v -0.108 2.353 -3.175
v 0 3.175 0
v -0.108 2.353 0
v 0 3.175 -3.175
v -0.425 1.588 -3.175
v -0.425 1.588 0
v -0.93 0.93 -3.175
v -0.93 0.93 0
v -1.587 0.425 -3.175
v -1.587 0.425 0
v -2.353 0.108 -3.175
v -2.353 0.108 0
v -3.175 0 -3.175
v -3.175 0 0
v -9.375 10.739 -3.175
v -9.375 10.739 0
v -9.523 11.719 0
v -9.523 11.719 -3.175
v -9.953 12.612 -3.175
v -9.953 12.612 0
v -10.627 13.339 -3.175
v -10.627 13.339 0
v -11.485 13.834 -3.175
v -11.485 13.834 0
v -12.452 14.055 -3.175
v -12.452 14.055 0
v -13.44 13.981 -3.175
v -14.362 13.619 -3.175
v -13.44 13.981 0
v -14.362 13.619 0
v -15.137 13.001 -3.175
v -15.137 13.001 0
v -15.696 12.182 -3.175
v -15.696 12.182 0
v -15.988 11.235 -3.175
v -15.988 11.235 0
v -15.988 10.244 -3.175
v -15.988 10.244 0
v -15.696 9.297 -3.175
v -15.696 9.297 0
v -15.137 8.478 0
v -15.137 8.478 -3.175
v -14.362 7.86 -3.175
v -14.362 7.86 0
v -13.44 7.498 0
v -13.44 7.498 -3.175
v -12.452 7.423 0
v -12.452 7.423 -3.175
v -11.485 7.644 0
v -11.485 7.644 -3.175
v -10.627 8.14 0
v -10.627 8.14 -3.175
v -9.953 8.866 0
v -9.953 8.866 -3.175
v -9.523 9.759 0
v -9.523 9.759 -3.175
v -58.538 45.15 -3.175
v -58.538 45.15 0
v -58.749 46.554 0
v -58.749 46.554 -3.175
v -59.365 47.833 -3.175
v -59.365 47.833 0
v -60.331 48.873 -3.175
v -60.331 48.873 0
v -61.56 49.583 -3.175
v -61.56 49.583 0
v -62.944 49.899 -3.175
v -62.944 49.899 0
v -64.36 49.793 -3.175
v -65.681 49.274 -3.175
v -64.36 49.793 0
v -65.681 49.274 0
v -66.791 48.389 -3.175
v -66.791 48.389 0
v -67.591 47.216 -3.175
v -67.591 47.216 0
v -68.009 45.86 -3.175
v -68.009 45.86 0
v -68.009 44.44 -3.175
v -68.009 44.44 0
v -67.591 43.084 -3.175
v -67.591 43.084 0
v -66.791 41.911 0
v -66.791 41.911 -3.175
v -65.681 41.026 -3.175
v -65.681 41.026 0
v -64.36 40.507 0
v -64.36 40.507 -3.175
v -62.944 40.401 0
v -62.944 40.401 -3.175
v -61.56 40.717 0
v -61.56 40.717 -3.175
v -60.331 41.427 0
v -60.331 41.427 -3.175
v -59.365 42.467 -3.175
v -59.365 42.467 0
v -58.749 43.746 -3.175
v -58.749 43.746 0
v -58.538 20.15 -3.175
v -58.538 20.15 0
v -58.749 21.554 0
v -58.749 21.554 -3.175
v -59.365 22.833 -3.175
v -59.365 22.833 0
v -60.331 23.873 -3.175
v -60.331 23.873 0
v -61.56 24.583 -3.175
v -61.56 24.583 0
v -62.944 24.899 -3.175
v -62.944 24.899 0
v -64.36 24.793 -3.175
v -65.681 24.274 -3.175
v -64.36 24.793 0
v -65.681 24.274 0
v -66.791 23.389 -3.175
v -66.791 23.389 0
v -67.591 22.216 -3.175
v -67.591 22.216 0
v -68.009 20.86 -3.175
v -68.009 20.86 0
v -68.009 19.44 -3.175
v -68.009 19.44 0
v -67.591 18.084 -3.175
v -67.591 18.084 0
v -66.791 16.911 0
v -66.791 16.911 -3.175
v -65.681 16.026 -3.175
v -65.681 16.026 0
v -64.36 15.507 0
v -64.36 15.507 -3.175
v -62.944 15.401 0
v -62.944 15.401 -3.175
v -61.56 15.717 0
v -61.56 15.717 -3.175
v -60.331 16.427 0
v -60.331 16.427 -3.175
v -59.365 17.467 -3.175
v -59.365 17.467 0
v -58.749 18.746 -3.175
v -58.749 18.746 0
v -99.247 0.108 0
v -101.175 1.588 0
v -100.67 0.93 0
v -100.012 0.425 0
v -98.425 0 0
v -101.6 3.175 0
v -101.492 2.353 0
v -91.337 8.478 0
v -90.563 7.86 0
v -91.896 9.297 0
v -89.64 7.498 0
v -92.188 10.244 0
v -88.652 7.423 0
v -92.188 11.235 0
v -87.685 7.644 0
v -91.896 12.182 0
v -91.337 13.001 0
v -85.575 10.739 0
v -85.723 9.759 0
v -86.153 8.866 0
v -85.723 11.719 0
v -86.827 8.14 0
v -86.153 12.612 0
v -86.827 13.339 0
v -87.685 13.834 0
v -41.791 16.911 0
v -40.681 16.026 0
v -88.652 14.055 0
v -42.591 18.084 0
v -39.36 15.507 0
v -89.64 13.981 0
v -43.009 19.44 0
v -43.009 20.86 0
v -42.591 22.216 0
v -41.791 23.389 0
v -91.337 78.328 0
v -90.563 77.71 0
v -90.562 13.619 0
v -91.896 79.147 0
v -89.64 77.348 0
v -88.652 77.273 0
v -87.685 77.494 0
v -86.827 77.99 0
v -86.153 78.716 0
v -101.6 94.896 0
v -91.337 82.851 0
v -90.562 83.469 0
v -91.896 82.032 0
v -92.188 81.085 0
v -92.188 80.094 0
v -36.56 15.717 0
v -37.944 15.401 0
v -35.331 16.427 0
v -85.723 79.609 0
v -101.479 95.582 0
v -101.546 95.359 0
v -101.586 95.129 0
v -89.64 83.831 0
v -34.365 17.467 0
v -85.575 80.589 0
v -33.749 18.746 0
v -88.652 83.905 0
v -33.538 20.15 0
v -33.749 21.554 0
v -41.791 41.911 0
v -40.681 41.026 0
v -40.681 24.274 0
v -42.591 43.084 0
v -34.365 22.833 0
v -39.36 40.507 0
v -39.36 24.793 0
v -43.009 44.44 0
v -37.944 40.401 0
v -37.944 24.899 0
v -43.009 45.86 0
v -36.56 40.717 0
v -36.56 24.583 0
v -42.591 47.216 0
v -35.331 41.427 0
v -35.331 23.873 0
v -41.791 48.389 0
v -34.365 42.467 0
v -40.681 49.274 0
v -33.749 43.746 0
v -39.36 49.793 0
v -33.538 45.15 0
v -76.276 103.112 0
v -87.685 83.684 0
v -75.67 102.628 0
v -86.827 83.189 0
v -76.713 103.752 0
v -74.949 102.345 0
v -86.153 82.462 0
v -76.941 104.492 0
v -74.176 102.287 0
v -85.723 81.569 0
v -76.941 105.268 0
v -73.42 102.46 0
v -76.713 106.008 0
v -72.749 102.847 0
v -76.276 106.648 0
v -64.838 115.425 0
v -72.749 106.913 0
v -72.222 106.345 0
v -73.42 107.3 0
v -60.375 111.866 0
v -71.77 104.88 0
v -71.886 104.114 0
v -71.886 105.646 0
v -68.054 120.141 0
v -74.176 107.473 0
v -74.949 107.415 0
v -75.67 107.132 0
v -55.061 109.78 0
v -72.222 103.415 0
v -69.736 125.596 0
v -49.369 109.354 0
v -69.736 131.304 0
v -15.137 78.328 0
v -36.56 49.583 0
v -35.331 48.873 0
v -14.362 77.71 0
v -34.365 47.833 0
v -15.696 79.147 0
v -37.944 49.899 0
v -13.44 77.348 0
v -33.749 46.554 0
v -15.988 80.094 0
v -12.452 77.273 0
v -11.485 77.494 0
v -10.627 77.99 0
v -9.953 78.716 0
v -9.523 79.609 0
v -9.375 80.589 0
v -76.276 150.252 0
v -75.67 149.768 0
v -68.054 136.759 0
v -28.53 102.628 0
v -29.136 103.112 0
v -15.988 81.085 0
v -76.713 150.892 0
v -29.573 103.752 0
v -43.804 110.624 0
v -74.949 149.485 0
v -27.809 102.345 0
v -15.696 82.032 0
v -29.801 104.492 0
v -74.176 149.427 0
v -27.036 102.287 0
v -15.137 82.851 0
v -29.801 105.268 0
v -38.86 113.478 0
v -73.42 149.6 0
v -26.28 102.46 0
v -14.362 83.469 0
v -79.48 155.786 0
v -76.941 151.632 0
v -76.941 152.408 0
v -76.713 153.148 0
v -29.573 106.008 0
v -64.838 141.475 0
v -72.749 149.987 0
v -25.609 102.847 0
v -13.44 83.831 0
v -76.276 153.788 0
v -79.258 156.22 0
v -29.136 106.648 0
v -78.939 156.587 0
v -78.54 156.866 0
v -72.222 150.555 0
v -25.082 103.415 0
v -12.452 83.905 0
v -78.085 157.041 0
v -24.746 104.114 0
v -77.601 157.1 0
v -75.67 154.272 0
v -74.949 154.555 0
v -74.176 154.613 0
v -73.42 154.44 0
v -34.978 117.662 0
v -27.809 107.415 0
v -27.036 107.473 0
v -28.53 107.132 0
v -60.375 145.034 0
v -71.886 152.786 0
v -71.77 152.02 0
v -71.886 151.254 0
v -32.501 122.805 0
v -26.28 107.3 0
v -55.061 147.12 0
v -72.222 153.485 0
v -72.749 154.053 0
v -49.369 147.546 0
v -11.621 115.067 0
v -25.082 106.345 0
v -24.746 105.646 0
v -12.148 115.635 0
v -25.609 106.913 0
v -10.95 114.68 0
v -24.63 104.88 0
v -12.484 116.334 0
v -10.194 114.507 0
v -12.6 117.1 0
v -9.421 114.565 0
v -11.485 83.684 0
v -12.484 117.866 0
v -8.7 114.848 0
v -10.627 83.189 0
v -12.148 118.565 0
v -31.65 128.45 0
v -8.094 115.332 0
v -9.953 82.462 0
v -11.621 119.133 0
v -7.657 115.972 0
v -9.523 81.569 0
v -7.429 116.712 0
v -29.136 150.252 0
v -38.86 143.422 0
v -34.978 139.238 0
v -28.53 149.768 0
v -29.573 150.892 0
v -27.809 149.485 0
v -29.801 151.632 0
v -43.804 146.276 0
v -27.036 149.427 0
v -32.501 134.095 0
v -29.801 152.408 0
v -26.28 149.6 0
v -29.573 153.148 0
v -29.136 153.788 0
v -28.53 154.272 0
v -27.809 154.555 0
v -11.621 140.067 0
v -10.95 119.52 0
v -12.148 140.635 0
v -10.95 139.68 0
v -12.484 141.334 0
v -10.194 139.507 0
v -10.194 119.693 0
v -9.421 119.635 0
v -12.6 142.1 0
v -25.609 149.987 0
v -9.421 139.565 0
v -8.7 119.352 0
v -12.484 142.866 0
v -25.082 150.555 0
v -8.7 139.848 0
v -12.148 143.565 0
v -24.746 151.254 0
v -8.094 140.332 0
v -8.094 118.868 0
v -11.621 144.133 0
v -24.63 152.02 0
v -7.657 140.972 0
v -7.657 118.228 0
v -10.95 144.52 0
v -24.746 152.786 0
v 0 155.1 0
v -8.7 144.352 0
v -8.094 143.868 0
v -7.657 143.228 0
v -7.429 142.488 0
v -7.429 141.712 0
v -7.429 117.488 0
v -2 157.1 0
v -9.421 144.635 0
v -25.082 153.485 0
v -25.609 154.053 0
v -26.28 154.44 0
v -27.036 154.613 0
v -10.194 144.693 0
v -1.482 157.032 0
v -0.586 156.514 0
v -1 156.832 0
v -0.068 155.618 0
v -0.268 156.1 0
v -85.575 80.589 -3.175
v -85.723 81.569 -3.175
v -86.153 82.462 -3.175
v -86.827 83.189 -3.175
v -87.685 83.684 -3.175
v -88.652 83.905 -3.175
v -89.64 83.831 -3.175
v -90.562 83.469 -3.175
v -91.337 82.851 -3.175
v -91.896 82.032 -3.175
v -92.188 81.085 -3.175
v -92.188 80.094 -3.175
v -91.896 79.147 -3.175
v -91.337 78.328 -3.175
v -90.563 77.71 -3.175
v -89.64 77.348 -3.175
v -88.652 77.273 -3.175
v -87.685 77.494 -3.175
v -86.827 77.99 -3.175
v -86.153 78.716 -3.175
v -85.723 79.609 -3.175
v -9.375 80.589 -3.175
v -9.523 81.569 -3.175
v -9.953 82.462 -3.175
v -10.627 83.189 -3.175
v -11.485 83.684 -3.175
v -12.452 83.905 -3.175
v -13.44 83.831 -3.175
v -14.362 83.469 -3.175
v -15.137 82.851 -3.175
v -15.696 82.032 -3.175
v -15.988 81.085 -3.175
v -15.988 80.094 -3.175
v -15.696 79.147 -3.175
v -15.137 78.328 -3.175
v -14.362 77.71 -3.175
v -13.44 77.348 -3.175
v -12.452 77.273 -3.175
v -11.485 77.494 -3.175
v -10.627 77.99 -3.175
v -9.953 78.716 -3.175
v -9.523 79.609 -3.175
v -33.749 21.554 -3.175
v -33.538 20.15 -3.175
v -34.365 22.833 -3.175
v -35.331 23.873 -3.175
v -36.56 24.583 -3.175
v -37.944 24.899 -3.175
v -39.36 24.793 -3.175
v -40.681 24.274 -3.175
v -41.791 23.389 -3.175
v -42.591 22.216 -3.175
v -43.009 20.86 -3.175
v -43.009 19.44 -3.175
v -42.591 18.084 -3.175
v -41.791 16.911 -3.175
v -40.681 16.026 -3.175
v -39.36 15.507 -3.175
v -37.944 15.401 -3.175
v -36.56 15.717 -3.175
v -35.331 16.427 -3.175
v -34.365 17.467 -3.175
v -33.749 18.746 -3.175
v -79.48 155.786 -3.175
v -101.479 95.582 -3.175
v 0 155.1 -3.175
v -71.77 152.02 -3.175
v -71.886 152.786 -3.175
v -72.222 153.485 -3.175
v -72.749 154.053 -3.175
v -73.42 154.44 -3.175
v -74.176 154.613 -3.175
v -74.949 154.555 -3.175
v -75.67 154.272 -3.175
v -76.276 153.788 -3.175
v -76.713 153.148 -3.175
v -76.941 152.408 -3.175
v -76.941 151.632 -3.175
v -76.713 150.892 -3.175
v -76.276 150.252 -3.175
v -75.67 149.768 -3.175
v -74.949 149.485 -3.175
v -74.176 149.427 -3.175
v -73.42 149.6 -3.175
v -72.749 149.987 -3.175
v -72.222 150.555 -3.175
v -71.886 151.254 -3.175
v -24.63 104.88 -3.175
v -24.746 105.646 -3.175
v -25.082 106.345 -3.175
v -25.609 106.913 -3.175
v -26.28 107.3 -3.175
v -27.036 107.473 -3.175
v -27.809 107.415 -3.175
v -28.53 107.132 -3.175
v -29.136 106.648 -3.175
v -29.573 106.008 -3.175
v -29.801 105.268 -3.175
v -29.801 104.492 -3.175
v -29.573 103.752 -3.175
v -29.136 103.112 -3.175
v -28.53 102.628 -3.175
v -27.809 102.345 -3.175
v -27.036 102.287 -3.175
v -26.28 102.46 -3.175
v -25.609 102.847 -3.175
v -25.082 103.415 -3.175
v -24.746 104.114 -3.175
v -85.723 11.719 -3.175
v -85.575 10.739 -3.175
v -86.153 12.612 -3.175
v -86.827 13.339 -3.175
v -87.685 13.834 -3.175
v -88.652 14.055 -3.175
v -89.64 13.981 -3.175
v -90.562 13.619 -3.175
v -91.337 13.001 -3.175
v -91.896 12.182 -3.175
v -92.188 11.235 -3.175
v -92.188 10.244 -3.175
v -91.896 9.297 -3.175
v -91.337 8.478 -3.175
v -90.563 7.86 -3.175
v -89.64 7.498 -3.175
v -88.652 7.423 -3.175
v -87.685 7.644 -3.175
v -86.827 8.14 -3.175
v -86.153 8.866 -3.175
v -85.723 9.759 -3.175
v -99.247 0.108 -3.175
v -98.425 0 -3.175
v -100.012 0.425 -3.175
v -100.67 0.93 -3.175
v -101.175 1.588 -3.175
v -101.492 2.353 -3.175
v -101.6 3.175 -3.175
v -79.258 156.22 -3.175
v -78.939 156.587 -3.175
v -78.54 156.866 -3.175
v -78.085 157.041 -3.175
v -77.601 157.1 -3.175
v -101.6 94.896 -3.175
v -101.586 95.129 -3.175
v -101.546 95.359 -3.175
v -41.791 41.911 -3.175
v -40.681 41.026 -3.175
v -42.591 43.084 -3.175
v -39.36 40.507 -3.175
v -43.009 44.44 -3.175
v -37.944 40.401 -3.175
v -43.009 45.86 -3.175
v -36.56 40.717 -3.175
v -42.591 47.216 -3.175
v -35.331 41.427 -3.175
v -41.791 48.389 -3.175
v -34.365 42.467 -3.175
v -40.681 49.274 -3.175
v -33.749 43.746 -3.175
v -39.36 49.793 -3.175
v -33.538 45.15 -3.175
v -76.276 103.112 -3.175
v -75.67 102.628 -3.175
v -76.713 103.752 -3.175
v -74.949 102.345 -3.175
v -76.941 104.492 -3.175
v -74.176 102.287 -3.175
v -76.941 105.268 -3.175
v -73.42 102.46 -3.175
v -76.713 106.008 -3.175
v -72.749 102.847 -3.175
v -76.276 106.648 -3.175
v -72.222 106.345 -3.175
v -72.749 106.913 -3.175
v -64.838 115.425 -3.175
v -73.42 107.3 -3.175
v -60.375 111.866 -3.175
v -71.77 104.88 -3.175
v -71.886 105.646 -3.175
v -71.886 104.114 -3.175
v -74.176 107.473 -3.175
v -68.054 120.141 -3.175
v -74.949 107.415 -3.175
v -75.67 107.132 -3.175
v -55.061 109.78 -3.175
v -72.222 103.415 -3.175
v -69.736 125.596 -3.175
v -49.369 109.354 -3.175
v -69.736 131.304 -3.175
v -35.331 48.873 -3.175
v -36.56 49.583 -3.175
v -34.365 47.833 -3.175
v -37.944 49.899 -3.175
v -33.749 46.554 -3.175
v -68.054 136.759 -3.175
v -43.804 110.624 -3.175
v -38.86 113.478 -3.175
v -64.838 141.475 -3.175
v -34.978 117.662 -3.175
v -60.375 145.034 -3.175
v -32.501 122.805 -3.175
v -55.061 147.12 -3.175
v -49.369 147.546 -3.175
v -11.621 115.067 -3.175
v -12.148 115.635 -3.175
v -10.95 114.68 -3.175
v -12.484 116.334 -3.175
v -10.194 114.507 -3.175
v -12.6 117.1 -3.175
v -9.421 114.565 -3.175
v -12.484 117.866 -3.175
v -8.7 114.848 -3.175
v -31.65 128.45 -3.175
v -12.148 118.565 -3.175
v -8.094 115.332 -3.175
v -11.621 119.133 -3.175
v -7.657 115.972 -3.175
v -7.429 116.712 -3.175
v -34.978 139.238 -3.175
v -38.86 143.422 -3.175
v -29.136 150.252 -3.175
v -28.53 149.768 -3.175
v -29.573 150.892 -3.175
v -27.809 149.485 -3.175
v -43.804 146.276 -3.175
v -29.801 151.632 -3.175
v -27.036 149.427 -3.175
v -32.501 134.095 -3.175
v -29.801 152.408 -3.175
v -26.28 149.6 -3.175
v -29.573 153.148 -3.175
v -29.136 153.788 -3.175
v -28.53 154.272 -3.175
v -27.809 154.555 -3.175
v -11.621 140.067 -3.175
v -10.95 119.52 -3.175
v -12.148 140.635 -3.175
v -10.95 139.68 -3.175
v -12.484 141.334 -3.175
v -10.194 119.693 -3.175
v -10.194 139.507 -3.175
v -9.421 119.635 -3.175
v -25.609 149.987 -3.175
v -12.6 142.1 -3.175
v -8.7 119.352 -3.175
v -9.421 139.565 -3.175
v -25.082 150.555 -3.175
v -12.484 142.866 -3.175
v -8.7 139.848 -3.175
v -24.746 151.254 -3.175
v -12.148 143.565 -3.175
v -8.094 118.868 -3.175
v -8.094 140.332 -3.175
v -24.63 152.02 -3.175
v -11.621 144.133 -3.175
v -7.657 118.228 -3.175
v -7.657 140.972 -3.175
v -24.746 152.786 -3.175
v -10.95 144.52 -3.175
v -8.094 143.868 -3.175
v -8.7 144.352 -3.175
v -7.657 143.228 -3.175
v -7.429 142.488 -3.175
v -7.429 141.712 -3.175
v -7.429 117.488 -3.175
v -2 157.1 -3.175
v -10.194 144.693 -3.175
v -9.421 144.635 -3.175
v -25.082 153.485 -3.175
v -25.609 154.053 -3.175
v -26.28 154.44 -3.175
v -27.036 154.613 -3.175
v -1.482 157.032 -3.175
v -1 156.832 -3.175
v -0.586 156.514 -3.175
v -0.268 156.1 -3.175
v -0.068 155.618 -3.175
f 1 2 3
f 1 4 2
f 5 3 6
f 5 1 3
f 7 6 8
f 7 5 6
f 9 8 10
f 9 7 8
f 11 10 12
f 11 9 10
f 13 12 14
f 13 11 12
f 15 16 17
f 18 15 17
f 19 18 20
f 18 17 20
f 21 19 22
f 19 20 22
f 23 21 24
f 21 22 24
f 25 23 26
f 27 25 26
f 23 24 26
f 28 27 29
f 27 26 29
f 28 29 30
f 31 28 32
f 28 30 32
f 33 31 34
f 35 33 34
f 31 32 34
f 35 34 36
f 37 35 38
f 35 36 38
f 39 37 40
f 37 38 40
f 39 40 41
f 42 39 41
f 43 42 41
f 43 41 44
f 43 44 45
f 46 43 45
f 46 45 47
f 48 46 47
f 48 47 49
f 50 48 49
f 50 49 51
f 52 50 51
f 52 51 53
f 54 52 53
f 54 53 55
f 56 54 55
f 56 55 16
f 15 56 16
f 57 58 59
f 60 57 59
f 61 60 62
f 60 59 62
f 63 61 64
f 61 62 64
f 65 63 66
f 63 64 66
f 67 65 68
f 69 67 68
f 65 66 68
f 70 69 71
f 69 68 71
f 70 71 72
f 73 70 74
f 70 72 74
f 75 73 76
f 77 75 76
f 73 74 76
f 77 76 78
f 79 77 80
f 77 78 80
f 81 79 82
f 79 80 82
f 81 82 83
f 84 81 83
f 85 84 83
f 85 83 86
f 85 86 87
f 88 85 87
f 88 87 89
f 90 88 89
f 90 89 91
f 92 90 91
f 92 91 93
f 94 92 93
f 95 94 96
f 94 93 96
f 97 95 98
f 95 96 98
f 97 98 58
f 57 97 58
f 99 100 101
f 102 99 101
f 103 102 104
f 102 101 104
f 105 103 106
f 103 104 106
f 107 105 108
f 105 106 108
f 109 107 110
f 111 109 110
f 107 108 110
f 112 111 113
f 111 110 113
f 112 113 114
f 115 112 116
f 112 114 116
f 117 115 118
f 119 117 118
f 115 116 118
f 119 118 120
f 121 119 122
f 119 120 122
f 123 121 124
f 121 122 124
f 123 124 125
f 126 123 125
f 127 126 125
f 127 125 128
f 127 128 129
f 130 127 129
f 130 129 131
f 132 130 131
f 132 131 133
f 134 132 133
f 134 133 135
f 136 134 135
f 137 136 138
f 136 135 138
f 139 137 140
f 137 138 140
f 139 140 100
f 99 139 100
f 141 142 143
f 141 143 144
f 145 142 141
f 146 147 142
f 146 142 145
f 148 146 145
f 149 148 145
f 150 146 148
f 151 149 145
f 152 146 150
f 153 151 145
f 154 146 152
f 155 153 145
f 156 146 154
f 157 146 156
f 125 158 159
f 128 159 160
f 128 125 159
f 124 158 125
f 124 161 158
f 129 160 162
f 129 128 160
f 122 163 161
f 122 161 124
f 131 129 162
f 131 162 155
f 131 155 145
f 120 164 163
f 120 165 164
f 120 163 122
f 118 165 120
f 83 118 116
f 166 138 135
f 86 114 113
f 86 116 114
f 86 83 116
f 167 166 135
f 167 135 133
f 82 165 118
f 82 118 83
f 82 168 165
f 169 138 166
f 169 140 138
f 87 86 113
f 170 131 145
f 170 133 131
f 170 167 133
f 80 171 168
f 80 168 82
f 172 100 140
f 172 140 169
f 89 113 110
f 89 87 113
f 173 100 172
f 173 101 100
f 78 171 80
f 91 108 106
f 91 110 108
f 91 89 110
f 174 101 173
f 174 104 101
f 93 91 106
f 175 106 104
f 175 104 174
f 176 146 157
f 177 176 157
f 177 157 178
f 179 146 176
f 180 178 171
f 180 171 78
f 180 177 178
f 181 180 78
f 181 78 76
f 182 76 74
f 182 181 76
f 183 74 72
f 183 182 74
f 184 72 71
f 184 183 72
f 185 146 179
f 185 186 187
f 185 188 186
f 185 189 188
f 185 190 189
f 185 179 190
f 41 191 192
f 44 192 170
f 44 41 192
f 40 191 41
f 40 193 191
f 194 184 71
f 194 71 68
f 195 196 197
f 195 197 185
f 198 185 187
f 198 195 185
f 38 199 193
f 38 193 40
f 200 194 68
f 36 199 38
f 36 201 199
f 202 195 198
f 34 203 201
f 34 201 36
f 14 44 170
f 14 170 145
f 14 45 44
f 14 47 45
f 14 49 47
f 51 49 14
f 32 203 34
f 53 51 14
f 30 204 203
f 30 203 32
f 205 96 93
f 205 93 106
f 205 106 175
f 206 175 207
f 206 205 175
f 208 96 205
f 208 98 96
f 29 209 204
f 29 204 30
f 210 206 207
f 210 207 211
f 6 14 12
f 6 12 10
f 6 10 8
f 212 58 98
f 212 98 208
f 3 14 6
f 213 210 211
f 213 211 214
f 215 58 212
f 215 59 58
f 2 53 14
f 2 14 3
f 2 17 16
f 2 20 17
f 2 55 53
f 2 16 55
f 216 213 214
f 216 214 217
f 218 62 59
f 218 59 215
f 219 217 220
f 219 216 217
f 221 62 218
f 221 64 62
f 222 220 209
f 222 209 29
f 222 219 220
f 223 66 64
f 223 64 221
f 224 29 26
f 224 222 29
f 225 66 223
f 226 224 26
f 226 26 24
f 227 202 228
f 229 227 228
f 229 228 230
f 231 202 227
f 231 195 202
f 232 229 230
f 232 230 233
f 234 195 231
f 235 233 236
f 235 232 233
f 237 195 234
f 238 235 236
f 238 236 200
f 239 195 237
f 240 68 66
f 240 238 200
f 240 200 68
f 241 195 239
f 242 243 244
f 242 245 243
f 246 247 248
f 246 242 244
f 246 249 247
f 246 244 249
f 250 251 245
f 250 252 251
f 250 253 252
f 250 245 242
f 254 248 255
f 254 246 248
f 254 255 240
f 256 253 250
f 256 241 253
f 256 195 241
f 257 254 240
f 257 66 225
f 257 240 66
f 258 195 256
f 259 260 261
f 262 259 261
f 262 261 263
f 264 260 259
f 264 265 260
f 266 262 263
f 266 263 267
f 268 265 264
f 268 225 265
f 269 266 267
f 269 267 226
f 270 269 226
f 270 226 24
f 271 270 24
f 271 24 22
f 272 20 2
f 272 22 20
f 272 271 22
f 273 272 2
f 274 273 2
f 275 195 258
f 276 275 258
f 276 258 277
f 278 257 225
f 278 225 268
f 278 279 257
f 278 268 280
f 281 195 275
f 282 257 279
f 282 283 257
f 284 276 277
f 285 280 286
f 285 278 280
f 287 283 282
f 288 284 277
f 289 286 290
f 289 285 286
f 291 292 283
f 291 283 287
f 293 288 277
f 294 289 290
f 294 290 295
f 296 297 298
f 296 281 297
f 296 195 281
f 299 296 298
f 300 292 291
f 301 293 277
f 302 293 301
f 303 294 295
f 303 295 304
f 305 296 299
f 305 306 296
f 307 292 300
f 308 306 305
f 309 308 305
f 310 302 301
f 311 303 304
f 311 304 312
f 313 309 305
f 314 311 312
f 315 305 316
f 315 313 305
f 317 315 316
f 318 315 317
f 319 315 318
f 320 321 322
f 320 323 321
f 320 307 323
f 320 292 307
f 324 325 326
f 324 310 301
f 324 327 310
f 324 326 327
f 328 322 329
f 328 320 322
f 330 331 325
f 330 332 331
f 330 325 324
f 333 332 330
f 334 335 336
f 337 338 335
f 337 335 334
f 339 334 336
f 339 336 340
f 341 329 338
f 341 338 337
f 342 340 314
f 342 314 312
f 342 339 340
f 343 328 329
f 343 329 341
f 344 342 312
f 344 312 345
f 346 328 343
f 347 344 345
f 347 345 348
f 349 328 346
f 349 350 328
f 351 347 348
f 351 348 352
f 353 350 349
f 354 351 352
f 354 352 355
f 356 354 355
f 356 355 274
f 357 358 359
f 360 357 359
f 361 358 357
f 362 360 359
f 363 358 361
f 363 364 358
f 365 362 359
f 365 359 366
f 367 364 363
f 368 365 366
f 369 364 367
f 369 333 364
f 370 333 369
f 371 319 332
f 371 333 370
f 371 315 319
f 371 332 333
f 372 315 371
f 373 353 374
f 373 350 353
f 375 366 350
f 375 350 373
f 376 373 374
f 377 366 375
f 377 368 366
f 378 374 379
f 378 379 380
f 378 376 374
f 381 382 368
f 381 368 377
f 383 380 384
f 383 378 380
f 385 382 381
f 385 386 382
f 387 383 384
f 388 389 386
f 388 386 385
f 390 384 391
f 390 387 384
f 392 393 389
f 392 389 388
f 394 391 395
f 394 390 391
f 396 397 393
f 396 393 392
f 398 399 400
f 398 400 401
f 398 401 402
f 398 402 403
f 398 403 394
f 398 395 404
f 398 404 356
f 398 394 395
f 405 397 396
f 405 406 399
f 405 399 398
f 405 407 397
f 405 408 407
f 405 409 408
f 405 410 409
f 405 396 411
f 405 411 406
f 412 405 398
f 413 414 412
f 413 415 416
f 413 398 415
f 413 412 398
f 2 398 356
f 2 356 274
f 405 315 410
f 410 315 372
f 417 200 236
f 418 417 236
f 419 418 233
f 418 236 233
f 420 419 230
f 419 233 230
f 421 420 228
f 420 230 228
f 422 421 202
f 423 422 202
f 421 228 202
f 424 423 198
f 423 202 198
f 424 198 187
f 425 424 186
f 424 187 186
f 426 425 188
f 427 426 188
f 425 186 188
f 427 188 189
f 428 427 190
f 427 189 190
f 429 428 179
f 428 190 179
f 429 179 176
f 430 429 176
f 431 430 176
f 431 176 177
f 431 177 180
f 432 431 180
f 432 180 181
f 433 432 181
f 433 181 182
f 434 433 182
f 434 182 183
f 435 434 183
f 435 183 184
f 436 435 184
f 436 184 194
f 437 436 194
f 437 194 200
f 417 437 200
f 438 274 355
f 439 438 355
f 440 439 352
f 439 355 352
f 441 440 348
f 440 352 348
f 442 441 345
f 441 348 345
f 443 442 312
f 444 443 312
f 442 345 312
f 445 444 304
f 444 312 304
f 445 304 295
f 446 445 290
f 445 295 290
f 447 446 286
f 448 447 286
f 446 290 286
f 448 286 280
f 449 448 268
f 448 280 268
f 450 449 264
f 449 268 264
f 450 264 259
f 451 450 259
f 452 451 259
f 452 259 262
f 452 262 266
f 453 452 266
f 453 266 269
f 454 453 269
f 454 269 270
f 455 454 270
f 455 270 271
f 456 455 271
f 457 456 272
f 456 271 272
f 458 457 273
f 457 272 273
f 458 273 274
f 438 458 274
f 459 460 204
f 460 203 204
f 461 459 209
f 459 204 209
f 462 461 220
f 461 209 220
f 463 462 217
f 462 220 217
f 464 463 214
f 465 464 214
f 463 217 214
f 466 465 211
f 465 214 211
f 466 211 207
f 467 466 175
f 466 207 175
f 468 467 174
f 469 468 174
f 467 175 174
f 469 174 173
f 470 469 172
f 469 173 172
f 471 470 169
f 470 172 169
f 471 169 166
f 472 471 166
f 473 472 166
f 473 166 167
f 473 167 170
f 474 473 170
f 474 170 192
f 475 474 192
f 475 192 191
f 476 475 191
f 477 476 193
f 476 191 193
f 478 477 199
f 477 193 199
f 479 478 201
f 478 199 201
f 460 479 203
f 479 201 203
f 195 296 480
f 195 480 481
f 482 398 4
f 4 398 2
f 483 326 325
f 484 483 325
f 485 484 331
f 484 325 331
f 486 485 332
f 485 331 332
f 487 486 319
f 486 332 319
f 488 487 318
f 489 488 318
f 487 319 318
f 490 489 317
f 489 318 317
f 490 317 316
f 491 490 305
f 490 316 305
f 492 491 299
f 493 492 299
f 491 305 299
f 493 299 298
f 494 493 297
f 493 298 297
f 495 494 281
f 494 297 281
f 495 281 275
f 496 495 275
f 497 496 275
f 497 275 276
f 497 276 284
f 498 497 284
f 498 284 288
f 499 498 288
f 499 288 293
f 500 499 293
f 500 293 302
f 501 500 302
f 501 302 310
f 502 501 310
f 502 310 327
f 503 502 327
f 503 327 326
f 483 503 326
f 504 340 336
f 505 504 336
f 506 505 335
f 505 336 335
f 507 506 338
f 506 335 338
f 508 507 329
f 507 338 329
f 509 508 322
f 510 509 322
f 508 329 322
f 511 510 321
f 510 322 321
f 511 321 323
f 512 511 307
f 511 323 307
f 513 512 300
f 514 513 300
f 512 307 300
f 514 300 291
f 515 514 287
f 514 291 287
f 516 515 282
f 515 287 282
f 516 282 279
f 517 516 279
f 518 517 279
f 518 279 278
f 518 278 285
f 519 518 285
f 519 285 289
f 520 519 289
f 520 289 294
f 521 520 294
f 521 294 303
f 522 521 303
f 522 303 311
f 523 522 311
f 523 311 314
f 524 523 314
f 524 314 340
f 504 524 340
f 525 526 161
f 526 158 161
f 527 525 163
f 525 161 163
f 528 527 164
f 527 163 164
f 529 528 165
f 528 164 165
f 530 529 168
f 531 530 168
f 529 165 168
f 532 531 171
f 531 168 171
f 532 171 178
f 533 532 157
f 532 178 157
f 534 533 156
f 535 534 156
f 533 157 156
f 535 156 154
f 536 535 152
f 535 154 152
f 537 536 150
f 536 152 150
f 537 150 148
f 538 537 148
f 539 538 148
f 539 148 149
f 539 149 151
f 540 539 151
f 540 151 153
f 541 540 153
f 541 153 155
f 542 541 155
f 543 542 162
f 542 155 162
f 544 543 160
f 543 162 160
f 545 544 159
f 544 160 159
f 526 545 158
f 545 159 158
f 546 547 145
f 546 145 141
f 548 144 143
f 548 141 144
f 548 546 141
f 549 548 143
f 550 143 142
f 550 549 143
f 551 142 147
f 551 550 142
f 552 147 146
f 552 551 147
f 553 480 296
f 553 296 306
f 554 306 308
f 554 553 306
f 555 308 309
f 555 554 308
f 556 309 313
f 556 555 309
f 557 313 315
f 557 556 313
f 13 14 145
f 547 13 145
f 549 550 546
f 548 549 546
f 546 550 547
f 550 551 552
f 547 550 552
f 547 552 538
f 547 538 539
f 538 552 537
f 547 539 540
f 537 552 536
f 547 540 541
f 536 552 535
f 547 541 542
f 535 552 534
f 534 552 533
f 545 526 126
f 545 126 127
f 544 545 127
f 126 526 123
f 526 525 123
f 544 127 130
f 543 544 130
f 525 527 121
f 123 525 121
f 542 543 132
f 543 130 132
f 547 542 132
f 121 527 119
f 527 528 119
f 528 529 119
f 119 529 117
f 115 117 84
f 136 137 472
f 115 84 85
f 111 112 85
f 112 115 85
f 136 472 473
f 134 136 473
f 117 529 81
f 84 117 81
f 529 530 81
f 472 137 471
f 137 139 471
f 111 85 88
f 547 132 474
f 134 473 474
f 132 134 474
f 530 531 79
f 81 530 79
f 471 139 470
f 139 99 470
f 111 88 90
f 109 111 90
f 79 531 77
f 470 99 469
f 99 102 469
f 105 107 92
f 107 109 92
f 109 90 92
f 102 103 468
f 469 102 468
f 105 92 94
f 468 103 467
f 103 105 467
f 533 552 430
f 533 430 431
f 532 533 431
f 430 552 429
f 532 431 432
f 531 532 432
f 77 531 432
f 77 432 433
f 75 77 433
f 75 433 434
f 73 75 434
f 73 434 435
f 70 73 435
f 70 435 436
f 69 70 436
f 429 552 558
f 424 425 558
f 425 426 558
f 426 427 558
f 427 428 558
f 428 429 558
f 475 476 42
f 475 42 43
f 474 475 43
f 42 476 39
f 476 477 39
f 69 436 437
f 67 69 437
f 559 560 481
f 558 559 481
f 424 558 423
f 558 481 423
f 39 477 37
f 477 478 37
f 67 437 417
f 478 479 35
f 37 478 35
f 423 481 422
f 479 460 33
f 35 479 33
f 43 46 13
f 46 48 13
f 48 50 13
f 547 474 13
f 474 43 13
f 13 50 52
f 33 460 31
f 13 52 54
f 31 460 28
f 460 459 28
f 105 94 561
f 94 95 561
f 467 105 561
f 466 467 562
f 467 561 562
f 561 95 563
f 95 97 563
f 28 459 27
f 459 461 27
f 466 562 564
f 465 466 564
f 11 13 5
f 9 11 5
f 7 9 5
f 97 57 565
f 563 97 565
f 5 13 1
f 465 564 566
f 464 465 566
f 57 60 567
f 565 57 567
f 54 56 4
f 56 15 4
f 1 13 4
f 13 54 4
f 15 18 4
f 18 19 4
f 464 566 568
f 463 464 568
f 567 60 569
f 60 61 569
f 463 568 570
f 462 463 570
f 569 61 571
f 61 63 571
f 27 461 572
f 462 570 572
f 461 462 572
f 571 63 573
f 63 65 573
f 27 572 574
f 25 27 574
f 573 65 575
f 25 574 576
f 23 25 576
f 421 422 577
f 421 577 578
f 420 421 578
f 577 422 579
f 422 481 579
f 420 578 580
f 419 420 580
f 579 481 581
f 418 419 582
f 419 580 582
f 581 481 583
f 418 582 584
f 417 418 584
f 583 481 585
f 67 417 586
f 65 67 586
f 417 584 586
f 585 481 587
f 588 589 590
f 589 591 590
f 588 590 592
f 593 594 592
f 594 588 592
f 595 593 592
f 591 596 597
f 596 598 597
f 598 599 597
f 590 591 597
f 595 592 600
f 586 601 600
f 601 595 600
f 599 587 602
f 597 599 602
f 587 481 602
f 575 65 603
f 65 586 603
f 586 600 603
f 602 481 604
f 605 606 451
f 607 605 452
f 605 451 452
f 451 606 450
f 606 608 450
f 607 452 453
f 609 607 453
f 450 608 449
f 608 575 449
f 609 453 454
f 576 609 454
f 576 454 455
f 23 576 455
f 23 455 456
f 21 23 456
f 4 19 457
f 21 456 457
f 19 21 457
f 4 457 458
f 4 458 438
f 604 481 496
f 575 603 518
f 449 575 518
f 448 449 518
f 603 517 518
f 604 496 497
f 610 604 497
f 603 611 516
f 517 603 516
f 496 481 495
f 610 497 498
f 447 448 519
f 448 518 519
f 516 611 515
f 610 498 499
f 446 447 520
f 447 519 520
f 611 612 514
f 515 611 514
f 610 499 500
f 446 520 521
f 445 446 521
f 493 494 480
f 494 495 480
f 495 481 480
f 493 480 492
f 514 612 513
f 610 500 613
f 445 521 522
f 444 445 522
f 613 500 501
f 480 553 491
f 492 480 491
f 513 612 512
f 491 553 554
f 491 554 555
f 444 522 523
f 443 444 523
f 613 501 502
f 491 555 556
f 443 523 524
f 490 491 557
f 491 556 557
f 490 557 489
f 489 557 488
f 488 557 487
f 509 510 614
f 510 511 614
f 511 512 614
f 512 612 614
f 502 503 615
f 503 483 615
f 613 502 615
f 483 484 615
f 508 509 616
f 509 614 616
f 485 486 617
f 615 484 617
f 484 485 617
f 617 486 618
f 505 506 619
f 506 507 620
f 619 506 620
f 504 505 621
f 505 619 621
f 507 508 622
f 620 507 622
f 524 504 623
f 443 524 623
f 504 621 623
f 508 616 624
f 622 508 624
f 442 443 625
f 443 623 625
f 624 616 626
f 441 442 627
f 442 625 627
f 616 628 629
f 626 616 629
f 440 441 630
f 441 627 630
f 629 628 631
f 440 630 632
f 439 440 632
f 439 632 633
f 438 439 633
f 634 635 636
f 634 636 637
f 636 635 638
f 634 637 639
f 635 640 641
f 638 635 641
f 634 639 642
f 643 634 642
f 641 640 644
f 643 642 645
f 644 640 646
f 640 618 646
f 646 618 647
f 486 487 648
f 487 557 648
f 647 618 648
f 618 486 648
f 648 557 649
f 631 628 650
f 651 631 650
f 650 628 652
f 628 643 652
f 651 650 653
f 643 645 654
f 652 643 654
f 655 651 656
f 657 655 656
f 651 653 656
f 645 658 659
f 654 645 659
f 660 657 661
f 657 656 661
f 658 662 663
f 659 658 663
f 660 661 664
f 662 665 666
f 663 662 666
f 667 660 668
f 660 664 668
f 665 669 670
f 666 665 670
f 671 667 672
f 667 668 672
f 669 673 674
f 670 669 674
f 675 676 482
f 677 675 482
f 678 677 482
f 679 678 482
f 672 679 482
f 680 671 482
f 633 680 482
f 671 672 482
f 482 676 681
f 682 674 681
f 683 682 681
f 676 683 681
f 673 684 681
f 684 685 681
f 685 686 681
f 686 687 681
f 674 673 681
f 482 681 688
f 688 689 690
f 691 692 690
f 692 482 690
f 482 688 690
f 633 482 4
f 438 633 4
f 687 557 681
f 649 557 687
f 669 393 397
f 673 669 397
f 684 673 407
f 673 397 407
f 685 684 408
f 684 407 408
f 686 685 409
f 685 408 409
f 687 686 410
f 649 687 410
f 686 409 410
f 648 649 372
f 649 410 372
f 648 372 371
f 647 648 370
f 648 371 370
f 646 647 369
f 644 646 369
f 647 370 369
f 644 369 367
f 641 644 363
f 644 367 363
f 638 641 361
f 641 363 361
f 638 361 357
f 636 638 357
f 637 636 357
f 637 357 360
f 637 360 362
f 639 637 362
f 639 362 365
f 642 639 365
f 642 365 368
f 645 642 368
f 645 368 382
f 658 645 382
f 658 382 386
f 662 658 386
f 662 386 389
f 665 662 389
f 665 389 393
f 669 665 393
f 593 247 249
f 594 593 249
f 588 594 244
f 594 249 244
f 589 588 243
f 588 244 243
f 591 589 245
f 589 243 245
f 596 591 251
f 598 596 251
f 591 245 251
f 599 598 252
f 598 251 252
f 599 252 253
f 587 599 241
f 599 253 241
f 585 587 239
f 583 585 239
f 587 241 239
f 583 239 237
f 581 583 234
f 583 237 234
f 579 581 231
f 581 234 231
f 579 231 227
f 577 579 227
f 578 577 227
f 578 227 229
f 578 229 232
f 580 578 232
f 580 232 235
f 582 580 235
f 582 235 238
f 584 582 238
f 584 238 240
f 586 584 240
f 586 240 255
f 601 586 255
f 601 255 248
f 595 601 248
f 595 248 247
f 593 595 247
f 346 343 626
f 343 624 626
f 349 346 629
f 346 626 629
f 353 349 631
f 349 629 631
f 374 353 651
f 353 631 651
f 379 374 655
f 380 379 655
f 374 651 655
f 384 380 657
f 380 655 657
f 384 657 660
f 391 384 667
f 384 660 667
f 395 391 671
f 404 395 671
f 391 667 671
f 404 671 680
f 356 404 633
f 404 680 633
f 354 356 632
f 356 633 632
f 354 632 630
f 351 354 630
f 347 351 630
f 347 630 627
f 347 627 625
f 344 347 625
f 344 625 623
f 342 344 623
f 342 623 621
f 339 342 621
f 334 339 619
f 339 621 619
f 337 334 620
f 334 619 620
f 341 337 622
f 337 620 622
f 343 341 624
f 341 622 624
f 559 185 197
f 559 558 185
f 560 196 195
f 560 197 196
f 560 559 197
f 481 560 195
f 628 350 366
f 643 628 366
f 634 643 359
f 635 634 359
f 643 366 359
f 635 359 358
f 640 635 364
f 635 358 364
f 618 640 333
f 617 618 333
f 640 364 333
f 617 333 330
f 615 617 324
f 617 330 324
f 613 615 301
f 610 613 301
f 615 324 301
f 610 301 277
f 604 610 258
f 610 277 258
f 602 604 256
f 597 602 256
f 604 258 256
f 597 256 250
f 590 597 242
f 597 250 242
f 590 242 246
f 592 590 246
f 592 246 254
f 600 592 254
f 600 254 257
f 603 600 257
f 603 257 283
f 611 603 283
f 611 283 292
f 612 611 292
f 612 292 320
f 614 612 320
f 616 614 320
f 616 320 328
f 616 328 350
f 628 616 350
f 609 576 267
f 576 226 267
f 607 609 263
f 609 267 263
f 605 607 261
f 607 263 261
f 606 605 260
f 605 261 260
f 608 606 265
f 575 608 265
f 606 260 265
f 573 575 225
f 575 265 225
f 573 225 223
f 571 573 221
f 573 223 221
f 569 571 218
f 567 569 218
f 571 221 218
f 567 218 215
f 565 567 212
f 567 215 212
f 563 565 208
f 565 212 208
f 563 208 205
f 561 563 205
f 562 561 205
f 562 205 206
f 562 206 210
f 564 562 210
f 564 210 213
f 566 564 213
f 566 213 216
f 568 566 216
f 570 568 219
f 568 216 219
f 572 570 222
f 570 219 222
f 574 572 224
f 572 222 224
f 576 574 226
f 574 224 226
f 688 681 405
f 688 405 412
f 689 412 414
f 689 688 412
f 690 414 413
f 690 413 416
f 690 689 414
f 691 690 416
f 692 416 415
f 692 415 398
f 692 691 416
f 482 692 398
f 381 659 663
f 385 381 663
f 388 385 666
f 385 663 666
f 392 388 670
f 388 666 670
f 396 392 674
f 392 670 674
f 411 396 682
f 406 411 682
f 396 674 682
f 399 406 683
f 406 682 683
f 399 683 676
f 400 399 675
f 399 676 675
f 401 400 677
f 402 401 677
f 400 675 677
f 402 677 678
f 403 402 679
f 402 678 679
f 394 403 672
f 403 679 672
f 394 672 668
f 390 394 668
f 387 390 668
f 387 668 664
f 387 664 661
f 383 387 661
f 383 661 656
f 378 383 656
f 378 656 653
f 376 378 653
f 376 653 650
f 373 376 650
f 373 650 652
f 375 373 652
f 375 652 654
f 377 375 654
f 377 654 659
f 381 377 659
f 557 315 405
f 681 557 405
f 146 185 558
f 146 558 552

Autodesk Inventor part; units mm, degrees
ref_plane "YZ Plane" through (0, 0, 0) normal (1, 0, 0) x (0, 1, 0)
ref_plane "XZ Plane" through (0, 0, 0) normal (0, 1, 0) x (-1, 0, 0)
ref_plane "XY Plane" through (0, 0, 0) normal (0, 0, 1) x (1, 0, 0)
sketch "Sketch1" plane through (0, 0, 0) normal (0, 0, 1) x (1, 0, 0)
  line L0 (-88.9, 80.5892) -> (-12.7, 80.5892) construction
  line L1 (-12.7, 80.5892) -> (-12.7, 10.7392) construction
  line L2 (-12.7, 10.7392) -> (-88.9, 10.7392) construction
  line L3 (-88.9, 10.7392) -> (-88.9, 80.5892) construction
  line L4 (-88.9, 80.5892) -> (-88.9, 97.6783) construction
  line L5 (-88.9, 80.5892) -> (-101.6, 80.5892) construction
  line L6 (-101.6, 95.25) -> (-101.6, -6.35)
  line L7 (-12.7, 10.7392) -> (-12.7, -6.35) construction
  line L8 (0, -6.35) -> (-101.6, -6.35)
  line L9 (-12.7, 10.7392) -> (0, 10.7392) construction
  line L10 (0, 95.25) -> (0, -6.35)
  circle A0 centre (-12.7, 80.5892) radius 3.325
  circle A1 centre (-12.7, 10.7392) radius 3.325
  circle A2 centre (-88.9, 10.7392) radius 3.325
  circle A3 centre (-88.9, 80.5892) radius 3.325
  circle A4 centre (-63.3, 45.15) radius 2.1 construction
  circle A5 centre (-63.3, 20.15) radius 2.1 construction
  circle A6 centre (-38.3, 45.15) radius 2.1 construction
  circle A7 centre (-38.3, 20.15) radius 2.1 construction
  circle A8 centre (-63.3, 45.15) radius 4.7625
  circle A9 centre (-38.3, 45.15) radius 2.1 construction
  circle A10 centre (-38.3, 45.15) radius 4.7625
  circle A11 centre (-63.3, 20.15) radius 2.1 construction
  circle A12 centre (-63.3, 20.15) radius 4.7625
  circle A13 centre (-38.3, 20.15) radius 2.1 construction
  circle A14 centre (-38.3, 20.15) radius 4.7625
  line L11 (0, 95.25) -> (-101.6, 95.25) construction
  line L12 (-22.6, 156.65) -> (-79, 156.65) construction
  line L13 (-79, 156.65) -> (-79, 100.25) construction
  line L14 (-79, 100.25) -> (-22.6, 100.25) construction
  line L15 (-22.6, 100.25) -> (-22.6, 156.65) construction
  line L16 (-22.6, 128.45) -> (-79, 128.45) construction
  line L17 (-113.7839, 128.45) -> (12.1839, 128.45) construction
  line L18 (-27.23, 152.02) -> (-74.37, 152.02) construction
  line L19 (-74.37, 152.02) -> (-74.37, 104.88) construction
  line L20 (-74.37, 104.88) -> (-27.23, 104.88) construction
  line L21 (-27.23, 104.88) -> (-27.23, 152.02) construction
  line L22 (-27.23, 152.02) -> (-22.6, 152.02) construction
  line L23 (-27.23, 152.02) -> (-27.23, 156.65) construction
  line L24 (-74.37, 104.88) -> (-79, 104.88) construction
  line L25 (-74.37, 104.88) -> (-74.37, 100.25) construction
  circle A15 centre (-27.23, 152.02) radius 2.6
  circle A16 centre (-27.23, 104.88) radius 2.6
  circle A17 centre (-74.37, 104.88) radius 2.6
  circle A18 centre (-74.37, 152.02) radius 2.6
  circle A19 centre (-50.8, 128.45) radius 19.15
  circle A20 centre (-50.8, 128.45) radius 11.08 construction
  circle A21 centre (-50.8, 128.45) radius 13 construction
  line L26 (-50.8, -6.35) -> (-50.8, 203.8417) construction
  circle A22 centre (-74.37, 104.88) radius 13 construction
  circle A23 centre (-27.23, 104.88) radius 13 construction
  circle A24 centre (-74.37, 104.88) radius 11.08 construction
  circle A25 centre (-27.23, 104.88) radius 11.08 construction
  line L27 (-79, 157.1) -> (-101.6, 95.25)
  line L28 (0, 95.25) -> (-22.6, 157.1)
  line L29 (0, 0) -> (-101.6, 0)
  line L30 (-79, 157.1) -> (-22.6, 157.1)
  line L31 (-63.3, 45.15) -> (-38.3, 45.15) construction
  line L32 (-38.3, 45.15) -> (-38.3, 20.15) construction
  line L33 (-38.3, 20.15) -> (-63.3, 20.15) construction
  line L34 (-63.3, 20.15) -> (-63.3, 45.15) construction
  line L35 (0, 95.25) -> (0, 157.1)
  line L36 (0, 157.1) -> (-22.6, 157.1)
  point P0 (-39.7703, 127.3952)
  point P1 (-39.7703, 127.3951)
  point P2 (-50.8, 128.45)
  dimension "d0" = 6.65
  dimension "d1" = 6.65
  dimension "d2" = 6.65
  dimension "d3" = 6.65
  dimension "d4" = 69.85
  dimension "d5" = 76.2
  dimension "d6" = 9.525
  dimension "d7" = 9.525
  dimension "d8" = 9.525
  dimension "d9" = 9.525
  dimension "d10" = 101.6
  dimension "d12" = 56.4
  dimension "d13" = 56.4
  dimension "d14" = 0
  dimension "d15" = 47.14
  dimension "d16" = 47.14
  dimension "d17" = 5.2
  dimension "d18" = 5.2
  dimension "d19" = 5.2
  dimension "d20" = 5.2
  dimension "d21" = 38.3
  dimension "d22" = 22.16
  dimension "d23" = 26
  dimension "d24" = 28.2
  dimension "d25" = 50.8
  dimension "d26" = 5
  dimension "d27" = 95.25
  dimension "d28" = 26
  dimension "d29" = 26
  dimension "d30" = 22.16
  dimension "d31" = 22.16
  dimension "d34" = 0.45
  dimension "d36" = 25
  dimension "d37" = 25
  dimension "d38" = 26.5
extrude "Extrusion1" add sketch "Sketch1" against normal blind 3.175 contours L27 L30 L28 L10 L29 L6 | L36 L35 L28
fillet "Fillet1" radius 2 3 edges at (-79, 157.1, -1.5875) (-101.6, 95.25, -1.5875) (0, 157.1, -1.5875)
sketch "Sketch2" plane through (0, 0, -3.175) normal (0, 0, -1) x (-1, 0, 0)
  line L0 (0, 157.1) -> (20, 157.1) construction
  line L1 (20, 157.1) -> (20, 102.1) construction
  line L2 (20, 102.1) -> (0, 102.1) construction
  line L3 (0, 102.1) -> (0, 157.1) construction
  line L4 (77.6015, 157.1) -> (2, 157.1) construction
  line L5 (0, 155.1) -> (0, 0) construction
  line L6 (10, 102.1) -> (10, 157.1) construction
  line L7 (2, 157.1) -> (77.6015, 157.1) construction
  circle A0 centre (10, 142.1) radius 2.6
  circle A1 centre (10, 117.1) radius 2.6
  dimension "d39" = 20
  dimension "d40" = 55
  dimension "d41" = 5.2
  dimension "d42" = 5.2
  dimension "d43" = 15
  dimension "d44" = 15
extrude "Extrusion2" cut sketch "Sketch2" against normal up to next
fillet "Fillet2" radius 3.175 2 edges at (0, 0, -1.5875) (-101.6, 0, -1.5875)
equation "\"d0\" = d3"
equation "\"d1\" = d3"
equation "\"d2\" = d3"
equation "\"d7\" = d6"
equation "\"d8\" = d6"
equation "\"d9\" = d6"
equation "\"d16\" = d15"
equation "\"d18\" = d17"
equation "\"d19\" = d17"
equation "\"d20\" = d17"
equation "\"d24\" = 0.5 * d12"
equation "\"d44\" = d43"
properties part number "X Axis Belt Motor Frame Machined"
